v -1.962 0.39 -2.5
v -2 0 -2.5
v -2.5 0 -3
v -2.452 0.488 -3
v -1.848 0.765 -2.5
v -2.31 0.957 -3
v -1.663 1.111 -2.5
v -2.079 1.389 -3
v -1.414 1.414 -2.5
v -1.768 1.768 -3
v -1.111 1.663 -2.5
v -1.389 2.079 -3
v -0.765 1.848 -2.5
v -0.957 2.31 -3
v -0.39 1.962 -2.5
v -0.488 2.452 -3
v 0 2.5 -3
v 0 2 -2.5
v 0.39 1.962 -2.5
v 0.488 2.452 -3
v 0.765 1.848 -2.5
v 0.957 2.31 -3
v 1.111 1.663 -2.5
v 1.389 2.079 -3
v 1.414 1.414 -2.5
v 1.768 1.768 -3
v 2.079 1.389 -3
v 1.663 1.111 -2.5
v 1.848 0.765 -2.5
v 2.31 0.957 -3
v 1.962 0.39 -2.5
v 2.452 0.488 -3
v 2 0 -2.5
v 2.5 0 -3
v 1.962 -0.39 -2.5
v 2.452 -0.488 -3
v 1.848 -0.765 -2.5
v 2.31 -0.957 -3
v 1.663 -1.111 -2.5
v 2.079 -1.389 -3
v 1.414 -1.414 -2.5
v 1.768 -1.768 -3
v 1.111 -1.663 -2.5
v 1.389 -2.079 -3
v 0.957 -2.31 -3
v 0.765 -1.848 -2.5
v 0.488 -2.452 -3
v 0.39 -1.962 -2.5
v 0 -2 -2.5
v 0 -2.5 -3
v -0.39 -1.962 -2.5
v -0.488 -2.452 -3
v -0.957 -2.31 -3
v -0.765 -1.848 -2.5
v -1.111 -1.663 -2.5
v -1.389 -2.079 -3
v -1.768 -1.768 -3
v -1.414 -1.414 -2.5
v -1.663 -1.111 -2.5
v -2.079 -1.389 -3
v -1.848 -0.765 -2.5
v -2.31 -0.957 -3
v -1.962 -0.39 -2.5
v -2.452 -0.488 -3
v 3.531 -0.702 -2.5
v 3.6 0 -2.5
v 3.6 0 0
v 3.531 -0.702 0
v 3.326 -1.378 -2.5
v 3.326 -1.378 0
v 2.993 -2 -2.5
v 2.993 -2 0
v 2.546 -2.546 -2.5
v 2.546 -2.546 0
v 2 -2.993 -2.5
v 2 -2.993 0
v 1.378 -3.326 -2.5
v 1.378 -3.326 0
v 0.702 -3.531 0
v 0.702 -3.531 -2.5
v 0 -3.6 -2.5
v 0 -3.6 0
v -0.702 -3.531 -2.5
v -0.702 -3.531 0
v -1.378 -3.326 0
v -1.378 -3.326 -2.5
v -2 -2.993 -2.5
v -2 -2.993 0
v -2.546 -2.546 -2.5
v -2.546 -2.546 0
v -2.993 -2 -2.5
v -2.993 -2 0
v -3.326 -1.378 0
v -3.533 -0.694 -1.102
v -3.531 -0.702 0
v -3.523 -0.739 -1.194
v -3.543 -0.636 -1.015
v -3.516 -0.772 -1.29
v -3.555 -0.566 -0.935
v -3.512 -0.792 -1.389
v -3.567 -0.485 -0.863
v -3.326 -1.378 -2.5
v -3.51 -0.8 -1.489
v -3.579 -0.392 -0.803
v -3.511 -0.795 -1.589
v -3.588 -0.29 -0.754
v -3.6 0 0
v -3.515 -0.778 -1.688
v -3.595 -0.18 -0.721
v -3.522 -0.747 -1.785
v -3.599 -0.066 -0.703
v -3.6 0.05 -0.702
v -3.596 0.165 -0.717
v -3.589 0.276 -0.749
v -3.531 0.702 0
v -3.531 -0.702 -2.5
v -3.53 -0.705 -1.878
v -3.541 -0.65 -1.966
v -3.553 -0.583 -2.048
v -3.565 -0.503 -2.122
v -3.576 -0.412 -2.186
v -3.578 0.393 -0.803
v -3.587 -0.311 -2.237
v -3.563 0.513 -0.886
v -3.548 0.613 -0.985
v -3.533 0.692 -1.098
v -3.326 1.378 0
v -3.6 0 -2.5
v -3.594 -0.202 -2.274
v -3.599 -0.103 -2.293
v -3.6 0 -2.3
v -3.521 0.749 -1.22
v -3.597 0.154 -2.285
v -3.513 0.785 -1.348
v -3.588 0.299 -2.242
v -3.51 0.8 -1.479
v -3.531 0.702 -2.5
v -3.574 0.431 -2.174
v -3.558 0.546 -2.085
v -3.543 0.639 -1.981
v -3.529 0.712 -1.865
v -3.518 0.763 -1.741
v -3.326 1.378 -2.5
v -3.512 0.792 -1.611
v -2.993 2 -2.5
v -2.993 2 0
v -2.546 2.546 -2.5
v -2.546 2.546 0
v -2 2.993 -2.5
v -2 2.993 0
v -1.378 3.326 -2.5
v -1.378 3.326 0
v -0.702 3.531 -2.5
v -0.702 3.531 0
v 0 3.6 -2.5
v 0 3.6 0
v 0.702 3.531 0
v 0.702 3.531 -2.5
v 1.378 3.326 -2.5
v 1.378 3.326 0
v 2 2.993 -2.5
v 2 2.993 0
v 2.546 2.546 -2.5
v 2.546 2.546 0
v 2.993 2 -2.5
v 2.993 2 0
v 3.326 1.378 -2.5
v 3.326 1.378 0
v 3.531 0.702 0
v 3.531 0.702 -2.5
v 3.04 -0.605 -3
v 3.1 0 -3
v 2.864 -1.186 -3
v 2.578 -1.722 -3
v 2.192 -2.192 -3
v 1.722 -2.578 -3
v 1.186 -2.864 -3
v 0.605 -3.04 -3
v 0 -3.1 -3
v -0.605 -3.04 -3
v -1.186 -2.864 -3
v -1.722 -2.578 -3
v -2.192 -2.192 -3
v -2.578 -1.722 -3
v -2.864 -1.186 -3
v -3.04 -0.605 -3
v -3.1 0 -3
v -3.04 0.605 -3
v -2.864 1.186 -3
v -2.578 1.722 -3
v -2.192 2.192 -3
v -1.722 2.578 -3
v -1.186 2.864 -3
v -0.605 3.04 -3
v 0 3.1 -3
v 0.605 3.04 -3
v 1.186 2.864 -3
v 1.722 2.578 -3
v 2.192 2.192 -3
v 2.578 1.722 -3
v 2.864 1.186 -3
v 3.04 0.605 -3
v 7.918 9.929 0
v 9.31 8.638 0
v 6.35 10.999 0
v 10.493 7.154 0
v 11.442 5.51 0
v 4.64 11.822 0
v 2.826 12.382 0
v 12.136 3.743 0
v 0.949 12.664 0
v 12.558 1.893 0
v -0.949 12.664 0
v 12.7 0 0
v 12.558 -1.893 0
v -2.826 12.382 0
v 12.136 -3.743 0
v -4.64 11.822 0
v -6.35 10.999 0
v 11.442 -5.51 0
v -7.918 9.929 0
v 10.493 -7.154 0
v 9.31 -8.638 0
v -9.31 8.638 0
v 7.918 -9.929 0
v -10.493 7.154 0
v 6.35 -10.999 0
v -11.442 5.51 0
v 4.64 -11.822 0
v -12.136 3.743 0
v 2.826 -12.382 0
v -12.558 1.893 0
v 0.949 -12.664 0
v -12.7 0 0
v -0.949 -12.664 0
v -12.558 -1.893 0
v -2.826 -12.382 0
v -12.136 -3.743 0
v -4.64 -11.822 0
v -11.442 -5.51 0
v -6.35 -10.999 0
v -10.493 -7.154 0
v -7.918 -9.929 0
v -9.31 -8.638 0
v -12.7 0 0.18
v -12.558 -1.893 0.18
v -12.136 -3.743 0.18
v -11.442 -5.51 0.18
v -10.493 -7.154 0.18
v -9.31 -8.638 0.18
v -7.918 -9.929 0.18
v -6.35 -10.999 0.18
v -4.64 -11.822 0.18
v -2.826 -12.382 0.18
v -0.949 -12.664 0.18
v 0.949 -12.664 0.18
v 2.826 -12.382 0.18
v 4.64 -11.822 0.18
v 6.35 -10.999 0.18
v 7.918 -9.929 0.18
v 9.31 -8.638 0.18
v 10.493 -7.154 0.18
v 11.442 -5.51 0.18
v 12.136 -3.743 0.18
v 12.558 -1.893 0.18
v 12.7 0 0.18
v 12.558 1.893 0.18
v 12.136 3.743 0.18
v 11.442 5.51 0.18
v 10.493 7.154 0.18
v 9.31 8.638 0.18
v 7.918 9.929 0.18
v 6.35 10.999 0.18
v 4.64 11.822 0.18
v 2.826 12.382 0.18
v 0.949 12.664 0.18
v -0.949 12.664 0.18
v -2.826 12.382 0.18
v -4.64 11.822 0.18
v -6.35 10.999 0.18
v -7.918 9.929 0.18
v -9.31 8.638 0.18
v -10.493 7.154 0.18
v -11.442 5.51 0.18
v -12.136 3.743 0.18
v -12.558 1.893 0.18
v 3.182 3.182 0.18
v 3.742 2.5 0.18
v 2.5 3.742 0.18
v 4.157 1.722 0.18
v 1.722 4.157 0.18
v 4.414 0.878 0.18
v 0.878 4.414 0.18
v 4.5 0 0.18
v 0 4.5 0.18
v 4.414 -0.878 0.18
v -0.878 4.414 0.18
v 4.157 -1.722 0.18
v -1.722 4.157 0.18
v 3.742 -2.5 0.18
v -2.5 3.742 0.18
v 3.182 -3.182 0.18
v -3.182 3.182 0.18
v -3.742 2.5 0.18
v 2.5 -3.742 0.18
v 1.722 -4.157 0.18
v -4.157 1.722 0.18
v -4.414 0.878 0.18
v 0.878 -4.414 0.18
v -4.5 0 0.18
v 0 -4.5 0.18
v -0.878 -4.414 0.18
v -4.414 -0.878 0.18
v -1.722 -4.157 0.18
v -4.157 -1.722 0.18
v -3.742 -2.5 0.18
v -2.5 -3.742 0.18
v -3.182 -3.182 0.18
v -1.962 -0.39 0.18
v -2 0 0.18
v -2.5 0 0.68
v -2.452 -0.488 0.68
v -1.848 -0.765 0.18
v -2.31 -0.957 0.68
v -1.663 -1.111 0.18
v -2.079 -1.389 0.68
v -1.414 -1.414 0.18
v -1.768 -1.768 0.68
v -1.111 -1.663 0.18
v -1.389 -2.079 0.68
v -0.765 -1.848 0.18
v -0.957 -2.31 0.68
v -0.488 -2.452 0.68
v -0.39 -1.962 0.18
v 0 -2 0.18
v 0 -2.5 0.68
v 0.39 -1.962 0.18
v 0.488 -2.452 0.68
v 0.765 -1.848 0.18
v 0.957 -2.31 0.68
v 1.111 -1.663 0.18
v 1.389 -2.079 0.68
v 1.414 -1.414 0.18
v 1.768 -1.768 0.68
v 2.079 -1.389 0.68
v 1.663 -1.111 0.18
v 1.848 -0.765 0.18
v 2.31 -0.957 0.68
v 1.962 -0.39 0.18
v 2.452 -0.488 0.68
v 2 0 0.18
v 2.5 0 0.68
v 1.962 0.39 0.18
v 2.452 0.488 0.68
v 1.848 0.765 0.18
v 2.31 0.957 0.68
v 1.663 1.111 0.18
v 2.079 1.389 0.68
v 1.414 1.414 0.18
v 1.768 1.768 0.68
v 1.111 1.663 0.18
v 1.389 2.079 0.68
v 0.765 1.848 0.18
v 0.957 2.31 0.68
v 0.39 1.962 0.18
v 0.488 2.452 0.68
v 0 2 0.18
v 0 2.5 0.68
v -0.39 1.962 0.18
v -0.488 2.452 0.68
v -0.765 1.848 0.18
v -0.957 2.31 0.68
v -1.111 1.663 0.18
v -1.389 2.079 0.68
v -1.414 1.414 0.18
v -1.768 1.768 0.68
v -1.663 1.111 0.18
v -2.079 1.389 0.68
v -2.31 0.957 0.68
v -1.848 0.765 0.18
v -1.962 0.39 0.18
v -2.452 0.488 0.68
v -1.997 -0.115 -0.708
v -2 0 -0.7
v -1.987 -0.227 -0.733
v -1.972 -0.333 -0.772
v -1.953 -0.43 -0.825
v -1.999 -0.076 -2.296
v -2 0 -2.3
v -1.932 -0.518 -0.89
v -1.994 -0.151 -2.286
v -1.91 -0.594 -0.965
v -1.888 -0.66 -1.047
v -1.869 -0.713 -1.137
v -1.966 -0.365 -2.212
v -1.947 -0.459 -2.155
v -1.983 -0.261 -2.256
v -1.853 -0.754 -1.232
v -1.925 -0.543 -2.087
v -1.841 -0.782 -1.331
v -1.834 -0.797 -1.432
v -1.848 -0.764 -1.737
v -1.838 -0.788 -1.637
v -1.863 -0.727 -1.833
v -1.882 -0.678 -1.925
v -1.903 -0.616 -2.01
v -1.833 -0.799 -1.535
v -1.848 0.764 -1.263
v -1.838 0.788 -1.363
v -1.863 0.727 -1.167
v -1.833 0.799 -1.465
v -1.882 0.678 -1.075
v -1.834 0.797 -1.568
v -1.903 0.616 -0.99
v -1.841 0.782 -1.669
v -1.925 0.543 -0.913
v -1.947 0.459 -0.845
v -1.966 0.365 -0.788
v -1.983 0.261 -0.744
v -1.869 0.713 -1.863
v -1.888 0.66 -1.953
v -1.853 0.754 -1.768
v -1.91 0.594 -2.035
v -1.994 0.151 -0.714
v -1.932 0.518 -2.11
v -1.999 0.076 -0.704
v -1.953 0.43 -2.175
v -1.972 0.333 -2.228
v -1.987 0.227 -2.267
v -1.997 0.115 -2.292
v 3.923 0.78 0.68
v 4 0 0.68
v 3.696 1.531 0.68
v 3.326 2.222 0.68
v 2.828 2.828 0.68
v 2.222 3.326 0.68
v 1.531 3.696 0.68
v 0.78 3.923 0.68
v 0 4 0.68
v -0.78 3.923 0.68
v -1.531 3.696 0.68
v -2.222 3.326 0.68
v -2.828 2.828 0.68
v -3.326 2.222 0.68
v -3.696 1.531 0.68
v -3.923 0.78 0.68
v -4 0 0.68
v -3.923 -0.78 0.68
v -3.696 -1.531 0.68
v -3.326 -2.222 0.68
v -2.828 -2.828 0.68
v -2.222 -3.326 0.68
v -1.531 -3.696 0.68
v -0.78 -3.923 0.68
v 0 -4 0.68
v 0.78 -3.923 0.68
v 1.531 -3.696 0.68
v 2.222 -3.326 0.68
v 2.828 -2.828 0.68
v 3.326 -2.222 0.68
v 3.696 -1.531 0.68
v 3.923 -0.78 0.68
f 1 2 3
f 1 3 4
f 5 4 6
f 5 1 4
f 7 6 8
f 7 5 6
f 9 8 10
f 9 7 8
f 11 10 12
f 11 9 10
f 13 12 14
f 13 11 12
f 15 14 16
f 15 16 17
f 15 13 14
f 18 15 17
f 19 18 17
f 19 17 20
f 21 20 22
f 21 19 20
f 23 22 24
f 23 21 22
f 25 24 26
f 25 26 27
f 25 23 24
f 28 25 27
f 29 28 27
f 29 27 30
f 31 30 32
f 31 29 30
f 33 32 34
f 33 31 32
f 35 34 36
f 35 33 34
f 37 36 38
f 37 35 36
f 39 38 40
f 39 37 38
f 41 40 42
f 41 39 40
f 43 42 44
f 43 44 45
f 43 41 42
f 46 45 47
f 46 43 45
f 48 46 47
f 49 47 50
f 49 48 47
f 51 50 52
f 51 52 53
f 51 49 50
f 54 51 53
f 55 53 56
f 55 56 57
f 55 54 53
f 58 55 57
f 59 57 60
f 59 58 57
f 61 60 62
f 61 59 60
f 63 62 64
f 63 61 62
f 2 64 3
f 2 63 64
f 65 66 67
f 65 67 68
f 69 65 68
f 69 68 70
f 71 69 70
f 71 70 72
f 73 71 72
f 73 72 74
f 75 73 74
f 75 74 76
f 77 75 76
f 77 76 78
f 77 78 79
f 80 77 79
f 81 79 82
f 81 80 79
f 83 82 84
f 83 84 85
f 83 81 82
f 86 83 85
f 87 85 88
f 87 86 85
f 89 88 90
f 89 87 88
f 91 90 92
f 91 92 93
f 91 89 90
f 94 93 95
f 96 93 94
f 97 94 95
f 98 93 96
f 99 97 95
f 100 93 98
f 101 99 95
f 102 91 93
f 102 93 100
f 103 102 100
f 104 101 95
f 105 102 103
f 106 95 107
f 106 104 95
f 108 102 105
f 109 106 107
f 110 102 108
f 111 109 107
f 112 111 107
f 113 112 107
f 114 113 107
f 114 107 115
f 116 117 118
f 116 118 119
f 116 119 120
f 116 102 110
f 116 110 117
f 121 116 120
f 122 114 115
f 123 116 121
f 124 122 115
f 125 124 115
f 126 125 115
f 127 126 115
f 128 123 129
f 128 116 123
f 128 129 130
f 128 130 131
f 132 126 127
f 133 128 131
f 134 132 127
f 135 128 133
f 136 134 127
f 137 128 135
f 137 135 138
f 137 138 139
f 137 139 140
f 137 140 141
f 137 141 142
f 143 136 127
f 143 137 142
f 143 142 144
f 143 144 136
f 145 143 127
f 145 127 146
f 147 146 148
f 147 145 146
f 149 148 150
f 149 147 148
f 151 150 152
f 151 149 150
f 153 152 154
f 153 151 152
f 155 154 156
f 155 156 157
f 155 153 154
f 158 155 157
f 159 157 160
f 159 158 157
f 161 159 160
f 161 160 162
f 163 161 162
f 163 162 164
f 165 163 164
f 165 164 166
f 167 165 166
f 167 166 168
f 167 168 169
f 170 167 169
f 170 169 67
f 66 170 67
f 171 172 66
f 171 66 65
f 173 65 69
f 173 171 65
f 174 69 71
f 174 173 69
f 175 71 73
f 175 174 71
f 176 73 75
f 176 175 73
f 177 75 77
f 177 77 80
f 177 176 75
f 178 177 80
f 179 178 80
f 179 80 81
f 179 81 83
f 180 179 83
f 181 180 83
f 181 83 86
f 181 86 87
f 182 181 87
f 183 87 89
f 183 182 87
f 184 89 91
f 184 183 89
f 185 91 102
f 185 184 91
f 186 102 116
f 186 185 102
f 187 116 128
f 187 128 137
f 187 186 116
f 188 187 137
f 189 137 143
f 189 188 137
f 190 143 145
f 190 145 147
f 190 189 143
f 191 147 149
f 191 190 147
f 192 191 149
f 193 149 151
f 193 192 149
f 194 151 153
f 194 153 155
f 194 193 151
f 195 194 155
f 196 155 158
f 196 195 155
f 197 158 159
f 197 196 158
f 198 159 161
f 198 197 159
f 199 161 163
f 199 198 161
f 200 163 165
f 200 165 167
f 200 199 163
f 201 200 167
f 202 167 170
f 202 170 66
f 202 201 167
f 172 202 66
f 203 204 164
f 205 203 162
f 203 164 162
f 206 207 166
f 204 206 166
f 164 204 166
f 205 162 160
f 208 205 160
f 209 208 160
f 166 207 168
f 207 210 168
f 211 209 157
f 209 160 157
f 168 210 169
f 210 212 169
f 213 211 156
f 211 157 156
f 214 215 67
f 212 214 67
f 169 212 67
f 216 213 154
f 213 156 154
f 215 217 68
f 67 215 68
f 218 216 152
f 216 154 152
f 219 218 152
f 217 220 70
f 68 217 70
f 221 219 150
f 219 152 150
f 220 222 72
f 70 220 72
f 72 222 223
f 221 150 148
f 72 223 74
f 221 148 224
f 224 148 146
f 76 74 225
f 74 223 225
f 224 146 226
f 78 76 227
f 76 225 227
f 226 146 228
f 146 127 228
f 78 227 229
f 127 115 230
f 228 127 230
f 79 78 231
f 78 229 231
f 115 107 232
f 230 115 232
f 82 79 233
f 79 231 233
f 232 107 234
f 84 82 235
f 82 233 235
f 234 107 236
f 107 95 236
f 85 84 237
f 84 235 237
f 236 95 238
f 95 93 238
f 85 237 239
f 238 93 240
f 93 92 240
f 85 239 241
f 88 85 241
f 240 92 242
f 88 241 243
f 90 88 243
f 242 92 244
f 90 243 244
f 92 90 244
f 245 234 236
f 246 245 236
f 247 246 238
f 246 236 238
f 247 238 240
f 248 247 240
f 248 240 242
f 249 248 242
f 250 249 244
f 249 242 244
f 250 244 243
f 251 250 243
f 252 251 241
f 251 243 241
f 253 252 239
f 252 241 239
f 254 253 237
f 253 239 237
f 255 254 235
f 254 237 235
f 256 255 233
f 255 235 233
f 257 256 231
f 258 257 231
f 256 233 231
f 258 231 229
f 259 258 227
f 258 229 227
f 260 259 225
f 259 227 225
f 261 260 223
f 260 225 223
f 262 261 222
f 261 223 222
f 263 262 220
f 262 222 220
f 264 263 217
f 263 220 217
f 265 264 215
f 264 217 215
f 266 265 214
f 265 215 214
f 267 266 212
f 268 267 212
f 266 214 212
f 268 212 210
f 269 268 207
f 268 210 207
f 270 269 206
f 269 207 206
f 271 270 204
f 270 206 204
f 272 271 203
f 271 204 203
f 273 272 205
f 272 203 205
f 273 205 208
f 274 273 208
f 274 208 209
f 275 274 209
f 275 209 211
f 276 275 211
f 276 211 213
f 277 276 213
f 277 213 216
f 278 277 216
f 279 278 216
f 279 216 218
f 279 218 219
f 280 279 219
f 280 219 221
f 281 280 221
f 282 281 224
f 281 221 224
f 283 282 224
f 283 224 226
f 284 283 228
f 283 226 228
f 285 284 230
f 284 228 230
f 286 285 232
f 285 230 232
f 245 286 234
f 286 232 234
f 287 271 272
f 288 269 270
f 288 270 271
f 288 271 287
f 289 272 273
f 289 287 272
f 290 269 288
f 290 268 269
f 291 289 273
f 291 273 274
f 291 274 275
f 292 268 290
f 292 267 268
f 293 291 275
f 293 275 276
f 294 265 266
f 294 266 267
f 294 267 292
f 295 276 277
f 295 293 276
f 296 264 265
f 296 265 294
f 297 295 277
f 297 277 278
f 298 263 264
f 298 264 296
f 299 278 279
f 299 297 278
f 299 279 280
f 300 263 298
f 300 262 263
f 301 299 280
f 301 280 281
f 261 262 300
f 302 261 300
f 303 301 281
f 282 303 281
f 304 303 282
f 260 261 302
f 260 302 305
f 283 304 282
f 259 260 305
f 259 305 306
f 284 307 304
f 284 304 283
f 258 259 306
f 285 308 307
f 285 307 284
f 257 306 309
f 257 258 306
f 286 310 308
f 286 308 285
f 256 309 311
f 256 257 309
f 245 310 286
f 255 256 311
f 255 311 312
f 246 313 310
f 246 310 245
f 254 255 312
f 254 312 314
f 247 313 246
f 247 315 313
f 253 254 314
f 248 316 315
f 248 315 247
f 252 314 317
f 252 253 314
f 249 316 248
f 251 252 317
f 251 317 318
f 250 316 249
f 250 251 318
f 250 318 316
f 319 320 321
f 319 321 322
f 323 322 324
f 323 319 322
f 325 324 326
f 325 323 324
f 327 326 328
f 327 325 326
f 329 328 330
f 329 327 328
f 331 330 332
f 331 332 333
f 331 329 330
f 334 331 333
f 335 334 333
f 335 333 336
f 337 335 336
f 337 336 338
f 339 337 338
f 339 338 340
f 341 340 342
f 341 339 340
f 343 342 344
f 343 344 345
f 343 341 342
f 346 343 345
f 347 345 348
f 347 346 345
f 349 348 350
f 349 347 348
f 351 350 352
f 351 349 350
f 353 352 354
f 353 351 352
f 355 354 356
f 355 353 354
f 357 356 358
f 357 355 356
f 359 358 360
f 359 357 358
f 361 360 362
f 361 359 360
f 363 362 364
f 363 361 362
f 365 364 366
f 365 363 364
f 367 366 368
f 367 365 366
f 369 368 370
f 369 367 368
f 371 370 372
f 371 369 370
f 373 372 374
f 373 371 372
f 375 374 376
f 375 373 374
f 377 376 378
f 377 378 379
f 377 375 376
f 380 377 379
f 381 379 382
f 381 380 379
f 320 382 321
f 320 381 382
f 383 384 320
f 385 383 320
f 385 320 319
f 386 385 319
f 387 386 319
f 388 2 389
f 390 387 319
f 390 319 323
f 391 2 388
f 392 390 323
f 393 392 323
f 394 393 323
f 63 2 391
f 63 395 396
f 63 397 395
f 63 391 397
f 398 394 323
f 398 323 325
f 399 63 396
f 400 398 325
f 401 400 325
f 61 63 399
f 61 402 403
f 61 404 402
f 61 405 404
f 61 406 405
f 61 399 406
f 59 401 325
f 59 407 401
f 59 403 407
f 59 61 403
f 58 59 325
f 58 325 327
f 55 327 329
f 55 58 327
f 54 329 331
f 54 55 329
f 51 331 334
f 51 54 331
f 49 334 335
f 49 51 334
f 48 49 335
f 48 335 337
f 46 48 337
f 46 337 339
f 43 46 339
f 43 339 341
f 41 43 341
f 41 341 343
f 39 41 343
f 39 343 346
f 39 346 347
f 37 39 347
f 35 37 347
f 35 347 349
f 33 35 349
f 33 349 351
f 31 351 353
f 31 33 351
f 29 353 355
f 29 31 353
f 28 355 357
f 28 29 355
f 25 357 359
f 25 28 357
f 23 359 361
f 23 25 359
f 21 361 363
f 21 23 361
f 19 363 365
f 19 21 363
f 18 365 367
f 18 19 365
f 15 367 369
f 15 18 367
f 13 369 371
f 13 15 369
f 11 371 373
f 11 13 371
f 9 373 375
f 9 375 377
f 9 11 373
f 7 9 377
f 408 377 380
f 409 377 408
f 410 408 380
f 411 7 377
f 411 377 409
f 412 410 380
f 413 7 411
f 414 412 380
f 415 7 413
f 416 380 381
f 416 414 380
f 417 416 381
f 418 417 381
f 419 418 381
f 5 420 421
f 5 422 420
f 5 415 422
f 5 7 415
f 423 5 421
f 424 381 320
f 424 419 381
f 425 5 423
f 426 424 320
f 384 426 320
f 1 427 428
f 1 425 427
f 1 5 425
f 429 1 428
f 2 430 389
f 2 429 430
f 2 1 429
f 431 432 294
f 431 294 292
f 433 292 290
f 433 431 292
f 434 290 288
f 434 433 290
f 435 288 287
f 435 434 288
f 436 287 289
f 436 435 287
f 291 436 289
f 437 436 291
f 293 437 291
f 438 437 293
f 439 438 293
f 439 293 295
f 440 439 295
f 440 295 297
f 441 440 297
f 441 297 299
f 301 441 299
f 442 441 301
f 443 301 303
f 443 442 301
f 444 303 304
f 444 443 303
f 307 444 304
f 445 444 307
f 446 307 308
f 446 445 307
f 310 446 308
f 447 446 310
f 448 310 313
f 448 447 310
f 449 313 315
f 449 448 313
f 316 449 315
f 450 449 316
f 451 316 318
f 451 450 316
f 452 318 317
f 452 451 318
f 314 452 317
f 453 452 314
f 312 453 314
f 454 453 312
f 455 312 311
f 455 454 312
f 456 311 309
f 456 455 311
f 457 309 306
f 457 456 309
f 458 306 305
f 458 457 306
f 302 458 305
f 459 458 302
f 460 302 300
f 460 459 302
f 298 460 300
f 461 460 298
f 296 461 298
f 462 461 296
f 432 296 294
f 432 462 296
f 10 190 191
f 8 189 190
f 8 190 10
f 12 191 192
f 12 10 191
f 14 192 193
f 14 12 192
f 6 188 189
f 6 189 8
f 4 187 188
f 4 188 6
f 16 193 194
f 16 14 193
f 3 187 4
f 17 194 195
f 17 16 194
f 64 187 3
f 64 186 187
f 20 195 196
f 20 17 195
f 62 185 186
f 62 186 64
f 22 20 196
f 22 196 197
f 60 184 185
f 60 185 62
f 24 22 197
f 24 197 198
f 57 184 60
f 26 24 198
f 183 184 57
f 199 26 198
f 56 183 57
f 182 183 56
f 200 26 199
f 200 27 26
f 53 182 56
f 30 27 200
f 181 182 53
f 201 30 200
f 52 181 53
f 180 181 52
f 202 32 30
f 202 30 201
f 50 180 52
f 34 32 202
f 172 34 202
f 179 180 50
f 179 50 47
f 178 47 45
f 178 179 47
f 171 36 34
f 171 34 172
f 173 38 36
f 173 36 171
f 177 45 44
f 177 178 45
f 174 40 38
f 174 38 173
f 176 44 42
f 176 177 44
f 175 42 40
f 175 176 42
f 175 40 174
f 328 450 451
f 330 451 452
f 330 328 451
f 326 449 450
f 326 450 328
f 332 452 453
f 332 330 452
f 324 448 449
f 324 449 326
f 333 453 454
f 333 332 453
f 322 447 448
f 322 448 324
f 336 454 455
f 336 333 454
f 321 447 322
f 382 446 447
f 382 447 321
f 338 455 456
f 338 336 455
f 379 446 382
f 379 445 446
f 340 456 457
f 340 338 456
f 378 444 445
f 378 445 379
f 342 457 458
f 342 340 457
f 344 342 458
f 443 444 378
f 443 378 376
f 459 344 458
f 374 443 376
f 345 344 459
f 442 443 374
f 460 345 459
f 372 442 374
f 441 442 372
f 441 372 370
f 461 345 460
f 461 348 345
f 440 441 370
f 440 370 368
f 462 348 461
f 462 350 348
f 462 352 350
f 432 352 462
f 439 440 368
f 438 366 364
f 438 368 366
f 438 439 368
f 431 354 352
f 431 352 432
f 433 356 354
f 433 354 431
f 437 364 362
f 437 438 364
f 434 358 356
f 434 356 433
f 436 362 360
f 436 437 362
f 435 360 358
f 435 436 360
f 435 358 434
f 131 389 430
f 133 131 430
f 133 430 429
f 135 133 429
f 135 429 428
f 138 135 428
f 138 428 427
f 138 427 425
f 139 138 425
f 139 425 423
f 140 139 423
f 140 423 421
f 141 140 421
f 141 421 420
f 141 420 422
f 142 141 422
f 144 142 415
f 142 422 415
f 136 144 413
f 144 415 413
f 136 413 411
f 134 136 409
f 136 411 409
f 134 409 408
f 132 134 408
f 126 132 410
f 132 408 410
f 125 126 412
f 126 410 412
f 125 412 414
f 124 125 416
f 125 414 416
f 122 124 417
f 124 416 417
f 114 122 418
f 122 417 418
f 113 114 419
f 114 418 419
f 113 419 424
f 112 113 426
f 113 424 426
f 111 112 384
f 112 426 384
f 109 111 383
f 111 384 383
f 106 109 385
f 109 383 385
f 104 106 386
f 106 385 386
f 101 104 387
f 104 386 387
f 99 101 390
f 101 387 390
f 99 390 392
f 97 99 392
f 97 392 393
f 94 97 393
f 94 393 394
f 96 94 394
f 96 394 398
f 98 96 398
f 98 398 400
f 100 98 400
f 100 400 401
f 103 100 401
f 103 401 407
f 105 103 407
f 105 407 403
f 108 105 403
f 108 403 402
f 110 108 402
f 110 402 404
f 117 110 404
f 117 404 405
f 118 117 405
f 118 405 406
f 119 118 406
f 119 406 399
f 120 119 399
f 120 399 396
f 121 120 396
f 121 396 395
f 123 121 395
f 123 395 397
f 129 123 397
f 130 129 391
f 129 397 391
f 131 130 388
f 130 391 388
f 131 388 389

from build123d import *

# Parameters (mm, degrees)
SKETCH_1_R          = 12.7
SKETCH_1_R_2        = 2
EXTRUDE_1_DEPTH     = 0.18
EXTRUDE_START       = 3
SKETCH_2_R          = 3.6
SKETCH_2_R_2        = 2
EXTRUDE_2_DEPTH     = 3
SKETCH_3_R          = 0.8
CUT_EXTRUDE_1_DEPTH = 10
CHAMFER_1_SIZE      = 0.5
SKETCH_4_R          = 4.5
SKETCH_4_R_2        = 2
EXTRUDE_3_DEPTH     = 0.5
CHAMFER_2_SIZE      = 0.5
CHAMFER_3_SIZE      = 0.5


with BuildPart() as part:
    # 草图1 → 凸台-拉伸1 (new body)
    with BuildSketch(Plane.XY):
        with Locations(Location((0, 0, 0), (0, 0, 180))):
            Circle(SKETCH_1_R)
        with Locations(Location((0, 0, 0), (0, 0, 180))):
            Circle(SKETCH_1_R_2, mode=Mode.SUBTRACT)
    extrude(amount=EXTRUDE_1_DEPTH)

    # 草图2 → 凸台-拉伸2 (add)
    with BuildSketch(Plane(origin=(0, 0, 0), x_dir=(-1, 0, 0), z_dir=(0, 0, -1)).offset(EXTRUDE_START)):
        with Locations(Location((0, 0, 0), (0, 0, 180))):
            Circle(SKETCH_2_R)
        Circle(SKETCH_2_R_2, mode=Mode.SUBTRACT)
    extrude(amount=-EXTRUDE_2_DEPTH)

    # 草图3 → 切除-拉伸1 (cut)
    with BuildSketch(Plane(origin=(0, 0, 0), x_dir=(0, 0, -1), z_dir=(1, 0, 0))):
        with Locations((1.5, 0)):
            Circle(SKETCH_3_R)
    extrude(amount=-CUT_EXTRUDE_1_DEPTH, mode=Mode.SUBTRACT)

    # 倒角1
    chamfer_1_edges = [part.edges().sort_by_distance(p)[0] for p in [
        (-3.6, 0, -3),
        (2, 0, -3),
    ]]
    chamfer(chamfer_1_edges, length=CHAMFER_1_SIZE)

    # 草图4 → 凸台-拉伸3 (add)
    with BuildSketch(Plane.XY.offset(0.18)):
        Circle(SKETCH_4_R)
        with Locations(Location((0, 0, 0), (0, 0, 180))):
            Circle(SKETCH_4_R_2, mode=Mode.SUBTRACT)
    extrude(amount=EXTRUDE_3_DEPTH)

    # 倒角2
    chamfer_2_edges = [part.edges().sort_by_distance(p)[0] for p in [
        (-4.5, 0, 0.68),
    ]]
    chamfer(chamfer_2_edges, length=CHAMFER_2_SIZE - 0.0001)  # a hair under: the kernel refuses the full size

    # 倒角3
    chamfer_3_edges = [part.edges().sort_by_distance(p)[0] for p in [
        (2, 0, 0.68),
    ]]
    chamfer(chamfer_3_edges, length=CHAMFER_3_SIZE)


solid = part.part
